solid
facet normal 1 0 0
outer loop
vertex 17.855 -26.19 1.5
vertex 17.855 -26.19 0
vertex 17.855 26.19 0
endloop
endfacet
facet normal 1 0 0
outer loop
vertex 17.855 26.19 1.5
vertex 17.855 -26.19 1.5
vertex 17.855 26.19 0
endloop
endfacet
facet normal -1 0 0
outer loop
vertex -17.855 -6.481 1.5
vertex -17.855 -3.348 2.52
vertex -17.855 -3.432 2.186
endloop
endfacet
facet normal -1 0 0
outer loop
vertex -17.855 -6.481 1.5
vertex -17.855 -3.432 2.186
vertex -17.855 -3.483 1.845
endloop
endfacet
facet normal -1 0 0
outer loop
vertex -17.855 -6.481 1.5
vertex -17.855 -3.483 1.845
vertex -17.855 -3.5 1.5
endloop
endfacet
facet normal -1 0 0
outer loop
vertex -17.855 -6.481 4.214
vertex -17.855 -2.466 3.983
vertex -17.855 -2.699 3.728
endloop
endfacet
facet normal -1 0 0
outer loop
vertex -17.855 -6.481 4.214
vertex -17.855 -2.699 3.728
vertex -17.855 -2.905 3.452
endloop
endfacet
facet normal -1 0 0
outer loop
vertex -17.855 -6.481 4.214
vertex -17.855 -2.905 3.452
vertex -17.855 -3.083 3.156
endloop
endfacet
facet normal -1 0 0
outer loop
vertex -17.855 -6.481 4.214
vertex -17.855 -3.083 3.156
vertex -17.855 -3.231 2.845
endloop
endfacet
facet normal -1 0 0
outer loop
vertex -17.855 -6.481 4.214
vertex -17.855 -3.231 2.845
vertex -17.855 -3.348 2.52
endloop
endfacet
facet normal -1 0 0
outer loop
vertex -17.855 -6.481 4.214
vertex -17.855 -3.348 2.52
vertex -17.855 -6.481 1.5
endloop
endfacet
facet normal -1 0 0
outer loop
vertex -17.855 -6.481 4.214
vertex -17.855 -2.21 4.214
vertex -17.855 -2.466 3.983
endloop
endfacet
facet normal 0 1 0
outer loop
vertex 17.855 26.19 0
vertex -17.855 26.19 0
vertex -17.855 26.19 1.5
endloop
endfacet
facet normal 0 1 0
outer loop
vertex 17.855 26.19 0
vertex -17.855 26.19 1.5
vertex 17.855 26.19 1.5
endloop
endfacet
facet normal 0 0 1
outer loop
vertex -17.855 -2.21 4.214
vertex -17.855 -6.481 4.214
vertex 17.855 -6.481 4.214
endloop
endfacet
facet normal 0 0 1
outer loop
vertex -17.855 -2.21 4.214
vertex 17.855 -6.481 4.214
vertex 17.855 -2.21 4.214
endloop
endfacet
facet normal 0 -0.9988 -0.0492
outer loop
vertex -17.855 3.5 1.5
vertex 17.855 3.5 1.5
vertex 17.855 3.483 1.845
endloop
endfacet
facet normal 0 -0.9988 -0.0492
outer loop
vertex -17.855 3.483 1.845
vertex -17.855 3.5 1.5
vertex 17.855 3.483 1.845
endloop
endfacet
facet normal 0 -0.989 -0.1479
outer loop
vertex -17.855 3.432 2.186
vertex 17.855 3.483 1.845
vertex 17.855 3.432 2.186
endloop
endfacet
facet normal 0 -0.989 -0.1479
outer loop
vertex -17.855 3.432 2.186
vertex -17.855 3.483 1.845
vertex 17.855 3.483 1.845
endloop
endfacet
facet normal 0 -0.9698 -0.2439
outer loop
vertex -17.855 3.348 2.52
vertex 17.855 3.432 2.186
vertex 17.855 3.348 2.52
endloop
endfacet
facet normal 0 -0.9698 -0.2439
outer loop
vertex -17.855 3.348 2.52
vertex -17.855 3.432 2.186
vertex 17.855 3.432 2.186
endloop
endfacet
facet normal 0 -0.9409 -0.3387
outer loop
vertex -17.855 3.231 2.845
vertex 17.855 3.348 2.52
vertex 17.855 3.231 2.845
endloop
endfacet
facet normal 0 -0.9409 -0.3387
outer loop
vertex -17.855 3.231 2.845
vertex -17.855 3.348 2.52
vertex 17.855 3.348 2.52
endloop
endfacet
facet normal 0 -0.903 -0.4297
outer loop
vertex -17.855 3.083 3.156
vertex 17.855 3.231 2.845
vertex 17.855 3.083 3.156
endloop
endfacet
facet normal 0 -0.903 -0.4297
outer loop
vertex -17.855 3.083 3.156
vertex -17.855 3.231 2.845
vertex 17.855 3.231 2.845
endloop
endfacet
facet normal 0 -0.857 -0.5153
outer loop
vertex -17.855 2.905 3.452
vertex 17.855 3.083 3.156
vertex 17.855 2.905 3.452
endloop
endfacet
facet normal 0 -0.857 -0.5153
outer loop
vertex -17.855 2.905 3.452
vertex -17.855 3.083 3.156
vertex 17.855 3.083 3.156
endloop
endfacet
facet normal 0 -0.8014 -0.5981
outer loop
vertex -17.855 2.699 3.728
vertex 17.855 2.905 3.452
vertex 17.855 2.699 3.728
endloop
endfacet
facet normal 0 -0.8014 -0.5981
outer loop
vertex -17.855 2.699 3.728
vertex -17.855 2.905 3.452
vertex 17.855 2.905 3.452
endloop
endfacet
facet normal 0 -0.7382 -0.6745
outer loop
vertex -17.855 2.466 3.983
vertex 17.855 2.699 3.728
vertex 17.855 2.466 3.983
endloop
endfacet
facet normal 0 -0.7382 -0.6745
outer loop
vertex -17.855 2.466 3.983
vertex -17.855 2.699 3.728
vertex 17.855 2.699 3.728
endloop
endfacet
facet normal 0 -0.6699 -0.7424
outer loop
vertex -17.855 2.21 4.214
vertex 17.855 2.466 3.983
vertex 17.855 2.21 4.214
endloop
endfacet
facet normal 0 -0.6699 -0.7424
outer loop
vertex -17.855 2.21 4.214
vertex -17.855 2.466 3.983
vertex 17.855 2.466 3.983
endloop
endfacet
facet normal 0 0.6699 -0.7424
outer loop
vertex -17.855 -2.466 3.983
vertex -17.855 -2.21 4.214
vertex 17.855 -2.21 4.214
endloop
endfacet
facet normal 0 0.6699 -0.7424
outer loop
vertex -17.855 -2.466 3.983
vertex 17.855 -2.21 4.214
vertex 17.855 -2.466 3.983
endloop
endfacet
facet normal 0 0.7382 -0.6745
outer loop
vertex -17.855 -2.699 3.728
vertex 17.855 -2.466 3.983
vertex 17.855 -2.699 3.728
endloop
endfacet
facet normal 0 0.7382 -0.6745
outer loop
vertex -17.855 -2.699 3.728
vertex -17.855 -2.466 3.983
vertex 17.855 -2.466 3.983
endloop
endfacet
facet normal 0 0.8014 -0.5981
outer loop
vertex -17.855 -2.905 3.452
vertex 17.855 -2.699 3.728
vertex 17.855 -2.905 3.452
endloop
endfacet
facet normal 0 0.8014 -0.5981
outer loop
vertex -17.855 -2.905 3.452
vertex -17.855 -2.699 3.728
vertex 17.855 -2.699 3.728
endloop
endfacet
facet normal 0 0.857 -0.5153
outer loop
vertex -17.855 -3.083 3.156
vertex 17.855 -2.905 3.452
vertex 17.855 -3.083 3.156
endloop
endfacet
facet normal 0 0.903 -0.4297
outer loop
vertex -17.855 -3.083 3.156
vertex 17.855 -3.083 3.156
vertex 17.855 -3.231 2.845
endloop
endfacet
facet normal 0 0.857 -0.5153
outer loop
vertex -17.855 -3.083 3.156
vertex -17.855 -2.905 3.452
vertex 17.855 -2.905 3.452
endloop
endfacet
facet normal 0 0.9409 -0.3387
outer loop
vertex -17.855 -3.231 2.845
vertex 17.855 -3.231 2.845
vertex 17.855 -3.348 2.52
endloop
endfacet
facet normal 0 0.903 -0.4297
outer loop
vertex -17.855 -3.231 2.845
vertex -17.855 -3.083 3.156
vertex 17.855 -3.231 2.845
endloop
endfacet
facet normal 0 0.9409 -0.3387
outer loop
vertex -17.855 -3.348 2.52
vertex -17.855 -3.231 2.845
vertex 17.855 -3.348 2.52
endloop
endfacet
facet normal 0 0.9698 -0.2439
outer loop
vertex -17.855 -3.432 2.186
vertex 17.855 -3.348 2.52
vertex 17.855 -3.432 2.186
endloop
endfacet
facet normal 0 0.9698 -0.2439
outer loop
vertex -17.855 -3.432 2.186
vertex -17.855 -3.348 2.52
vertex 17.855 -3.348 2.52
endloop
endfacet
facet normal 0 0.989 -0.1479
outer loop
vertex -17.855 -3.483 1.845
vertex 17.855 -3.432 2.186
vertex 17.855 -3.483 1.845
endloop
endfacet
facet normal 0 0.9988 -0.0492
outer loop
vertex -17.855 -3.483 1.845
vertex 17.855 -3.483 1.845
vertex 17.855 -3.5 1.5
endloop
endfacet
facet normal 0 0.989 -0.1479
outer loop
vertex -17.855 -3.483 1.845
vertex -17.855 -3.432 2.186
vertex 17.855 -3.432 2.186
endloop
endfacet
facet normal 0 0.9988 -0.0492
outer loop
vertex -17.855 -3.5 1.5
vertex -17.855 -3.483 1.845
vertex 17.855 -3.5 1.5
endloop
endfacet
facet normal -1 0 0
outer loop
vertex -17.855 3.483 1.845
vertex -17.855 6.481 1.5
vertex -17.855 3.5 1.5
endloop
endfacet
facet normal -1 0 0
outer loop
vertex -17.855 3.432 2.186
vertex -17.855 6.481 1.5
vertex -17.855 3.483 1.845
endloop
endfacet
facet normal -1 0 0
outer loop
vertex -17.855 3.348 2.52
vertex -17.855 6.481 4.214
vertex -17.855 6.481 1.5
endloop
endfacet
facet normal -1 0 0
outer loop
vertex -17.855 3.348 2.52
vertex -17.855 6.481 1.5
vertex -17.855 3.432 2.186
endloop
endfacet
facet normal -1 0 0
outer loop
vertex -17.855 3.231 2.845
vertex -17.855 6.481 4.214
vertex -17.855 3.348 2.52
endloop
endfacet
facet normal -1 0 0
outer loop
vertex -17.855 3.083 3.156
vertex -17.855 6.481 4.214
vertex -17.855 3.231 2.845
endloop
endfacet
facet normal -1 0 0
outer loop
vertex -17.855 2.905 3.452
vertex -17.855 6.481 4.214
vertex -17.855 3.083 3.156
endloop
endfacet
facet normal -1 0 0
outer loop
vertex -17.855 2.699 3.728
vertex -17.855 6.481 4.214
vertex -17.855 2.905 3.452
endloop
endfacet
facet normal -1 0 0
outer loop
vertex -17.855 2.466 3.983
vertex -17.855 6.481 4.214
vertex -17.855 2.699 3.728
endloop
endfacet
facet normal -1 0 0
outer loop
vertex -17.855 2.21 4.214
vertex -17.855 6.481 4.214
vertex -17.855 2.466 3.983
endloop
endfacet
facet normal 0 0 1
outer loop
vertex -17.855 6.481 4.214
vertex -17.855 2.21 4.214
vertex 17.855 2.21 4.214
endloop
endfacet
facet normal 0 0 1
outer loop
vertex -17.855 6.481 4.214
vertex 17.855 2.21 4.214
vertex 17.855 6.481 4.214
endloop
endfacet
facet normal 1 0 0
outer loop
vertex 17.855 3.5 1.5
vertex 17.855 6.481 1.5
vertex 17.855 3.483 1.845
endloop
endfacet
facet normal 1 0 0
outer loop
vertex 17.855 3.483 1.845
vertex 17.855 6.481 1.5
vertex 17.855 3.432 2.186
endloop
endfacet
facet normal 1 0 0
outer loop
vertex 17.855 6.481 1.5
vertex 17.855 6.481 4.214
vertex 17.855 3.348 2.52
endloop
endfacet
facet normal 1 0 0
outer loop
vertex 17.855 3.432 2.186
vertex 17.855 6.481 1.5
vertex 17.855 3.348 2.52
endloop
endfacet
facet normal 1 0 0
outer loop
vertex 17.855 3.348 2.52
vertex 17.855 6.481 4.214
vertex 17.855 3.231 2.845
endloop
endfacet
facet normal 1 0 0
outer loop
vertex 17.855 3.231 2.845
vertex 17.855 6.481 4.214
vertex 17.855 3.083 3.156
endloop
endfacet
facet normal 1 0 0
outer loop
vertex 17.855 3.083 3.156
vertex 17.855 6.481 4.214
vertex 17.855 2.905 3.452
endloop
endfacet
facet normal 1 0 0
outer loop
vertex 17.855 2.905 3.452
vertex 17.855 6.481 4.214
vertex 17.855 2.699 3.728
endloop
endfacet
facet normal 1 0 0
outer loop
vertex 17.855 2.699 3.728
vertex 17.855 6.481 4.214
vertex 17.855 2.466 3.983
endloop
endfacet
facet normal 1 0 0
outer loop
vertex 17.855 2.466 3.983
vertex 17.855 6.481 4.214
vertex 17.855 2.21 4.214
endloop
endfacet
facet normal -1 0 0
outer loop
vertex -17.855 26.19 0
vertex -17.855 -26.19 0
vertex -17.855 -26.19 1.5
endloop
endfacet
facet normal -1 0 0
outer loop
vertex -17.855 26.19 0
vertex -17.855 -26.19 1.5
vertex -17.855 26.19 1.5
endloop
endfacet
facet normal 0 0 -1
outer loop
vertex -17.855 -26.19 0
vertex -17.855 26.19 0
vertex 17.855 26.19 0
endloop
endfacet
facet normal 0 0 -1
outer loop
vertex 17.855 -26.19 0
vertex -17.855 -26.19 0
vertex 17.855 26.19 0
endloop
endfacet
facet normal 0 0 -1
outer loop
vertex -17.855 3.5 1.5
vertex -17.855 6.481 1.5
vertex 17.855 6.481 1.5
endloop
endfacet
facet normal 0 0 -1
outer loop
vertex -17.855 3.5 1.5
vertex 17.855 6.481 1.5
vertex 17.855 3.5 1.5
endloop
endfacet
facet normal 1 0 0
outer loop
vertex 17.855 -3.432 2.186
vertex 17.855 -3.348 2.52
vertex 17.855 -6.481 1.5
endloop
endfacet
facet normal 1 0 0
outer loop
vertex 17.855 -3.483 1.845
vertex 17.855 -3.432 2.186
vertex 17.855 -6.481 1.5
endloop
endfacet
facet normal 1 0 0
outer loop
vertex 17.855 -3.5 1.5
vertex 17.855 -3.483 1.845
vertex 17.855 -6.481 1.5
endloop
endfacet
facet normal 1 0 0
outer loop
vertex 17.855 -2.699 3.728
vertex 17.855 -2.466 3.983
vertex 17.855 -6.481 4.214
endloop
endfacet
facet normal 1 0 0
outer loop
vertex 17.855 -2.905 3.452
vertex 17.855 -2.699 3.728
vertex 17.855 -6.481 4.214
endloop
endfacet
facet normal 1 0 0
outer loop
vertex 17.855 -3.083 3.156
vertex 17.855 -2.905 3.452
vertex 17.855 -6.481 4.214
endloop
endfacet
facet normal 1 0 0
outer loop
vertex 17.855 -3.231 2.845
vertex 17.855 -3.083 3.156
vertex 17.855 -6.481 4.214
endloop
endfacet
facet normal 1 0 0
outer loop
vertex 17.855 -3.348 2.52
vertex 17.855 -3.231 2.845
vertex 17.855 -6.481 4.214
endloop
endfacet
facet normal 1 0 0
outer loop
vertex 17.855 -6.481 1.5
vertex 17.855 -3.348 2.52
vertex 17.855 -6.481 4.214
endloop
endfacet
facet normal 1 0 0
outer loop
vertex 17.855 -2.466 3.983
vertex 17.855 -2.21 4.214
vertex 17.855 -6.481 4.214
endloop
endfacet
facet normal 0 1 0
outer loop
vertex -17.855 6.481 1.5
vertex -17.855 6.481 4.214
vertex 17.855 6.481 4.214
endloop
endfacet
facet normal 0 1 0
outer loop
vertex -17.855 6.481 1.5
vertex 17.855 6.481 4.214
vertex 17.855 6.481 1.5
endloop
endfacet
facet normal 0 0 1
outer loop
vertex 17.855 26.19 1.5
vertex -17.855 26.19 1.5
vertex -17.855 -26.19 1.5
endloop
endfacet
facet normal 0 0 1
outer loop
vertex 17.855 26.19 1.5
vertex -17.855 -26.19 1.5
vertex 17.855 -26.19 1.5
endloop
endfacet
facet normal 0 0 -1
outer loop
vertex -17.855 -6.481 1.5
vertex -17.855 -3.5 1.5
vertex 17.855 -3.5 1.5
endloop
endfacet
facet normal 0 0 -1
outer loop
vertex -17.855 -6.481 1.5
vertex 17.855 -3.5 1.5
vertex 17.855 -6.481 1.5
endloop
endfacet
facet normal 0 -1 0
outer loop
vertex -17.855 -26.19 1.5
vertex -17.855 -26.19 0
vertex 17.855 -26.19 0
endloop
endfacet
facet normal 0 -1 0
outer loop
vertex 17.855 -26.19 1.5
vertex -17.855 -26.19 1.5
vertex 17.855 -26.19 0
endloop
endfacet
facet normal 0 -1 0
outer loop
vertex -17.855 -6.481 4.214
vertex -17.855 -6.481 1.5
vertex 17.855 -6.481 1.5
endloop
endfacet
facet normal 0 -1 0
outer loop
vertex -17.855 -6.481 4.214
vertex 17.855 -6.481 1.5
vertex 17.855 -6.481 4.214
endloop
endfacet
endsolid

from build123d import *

# Parameters (mm, degrees)
F0_W     = 35.71
F0_H     = 52.38
F1_DEPTH = 1.5
F3_DEPTH = 35.71


with BuildPart() as f1:
    # F0 (on Top) → F1 (new body)
    with BuildSketch(Plane.XY):
        Rectangle(F0_W, F0_H)
    extrude(amount=F1_DEPTH)


with BuildPart() as f3:
    # F2 (on face) → F3 (new body, through all)
    with BuildSketch(Plane(origin=(-17.855, 0, 0), x_dir=(0, -1, 0), z_dir=(-1, 0, 0))):
        with BuildLine():
            ThreePointArc((-3.5, 1.5), (-3.161088, 3.002506), (-2.209986, 4.21403))
            Line((-2.209986, 4.21403), (-6.480924, 4.21403))
            Line((-6.480924, 4.21403), (-6.480924, 1.5))
            Line((-6.480924, 1.5), (-3.5, 1.5))
        make_face()
        with BuildLine():
            Line((6.480924, 4.21403), (2.209986, 4.21403))
            ThreePointArc((2.209986, 4.21403), (3.161088, 3.002506), (3.5, 1.5))
            Line((3.5, 1.5), (6.480924, 1.5))
            Line((6.480924, 1.5), (6.480924, 4.21403))
        make_face()
    extrude(amount=-F3_DEPTH)


solid = Compound([f1.part, f3.part])
